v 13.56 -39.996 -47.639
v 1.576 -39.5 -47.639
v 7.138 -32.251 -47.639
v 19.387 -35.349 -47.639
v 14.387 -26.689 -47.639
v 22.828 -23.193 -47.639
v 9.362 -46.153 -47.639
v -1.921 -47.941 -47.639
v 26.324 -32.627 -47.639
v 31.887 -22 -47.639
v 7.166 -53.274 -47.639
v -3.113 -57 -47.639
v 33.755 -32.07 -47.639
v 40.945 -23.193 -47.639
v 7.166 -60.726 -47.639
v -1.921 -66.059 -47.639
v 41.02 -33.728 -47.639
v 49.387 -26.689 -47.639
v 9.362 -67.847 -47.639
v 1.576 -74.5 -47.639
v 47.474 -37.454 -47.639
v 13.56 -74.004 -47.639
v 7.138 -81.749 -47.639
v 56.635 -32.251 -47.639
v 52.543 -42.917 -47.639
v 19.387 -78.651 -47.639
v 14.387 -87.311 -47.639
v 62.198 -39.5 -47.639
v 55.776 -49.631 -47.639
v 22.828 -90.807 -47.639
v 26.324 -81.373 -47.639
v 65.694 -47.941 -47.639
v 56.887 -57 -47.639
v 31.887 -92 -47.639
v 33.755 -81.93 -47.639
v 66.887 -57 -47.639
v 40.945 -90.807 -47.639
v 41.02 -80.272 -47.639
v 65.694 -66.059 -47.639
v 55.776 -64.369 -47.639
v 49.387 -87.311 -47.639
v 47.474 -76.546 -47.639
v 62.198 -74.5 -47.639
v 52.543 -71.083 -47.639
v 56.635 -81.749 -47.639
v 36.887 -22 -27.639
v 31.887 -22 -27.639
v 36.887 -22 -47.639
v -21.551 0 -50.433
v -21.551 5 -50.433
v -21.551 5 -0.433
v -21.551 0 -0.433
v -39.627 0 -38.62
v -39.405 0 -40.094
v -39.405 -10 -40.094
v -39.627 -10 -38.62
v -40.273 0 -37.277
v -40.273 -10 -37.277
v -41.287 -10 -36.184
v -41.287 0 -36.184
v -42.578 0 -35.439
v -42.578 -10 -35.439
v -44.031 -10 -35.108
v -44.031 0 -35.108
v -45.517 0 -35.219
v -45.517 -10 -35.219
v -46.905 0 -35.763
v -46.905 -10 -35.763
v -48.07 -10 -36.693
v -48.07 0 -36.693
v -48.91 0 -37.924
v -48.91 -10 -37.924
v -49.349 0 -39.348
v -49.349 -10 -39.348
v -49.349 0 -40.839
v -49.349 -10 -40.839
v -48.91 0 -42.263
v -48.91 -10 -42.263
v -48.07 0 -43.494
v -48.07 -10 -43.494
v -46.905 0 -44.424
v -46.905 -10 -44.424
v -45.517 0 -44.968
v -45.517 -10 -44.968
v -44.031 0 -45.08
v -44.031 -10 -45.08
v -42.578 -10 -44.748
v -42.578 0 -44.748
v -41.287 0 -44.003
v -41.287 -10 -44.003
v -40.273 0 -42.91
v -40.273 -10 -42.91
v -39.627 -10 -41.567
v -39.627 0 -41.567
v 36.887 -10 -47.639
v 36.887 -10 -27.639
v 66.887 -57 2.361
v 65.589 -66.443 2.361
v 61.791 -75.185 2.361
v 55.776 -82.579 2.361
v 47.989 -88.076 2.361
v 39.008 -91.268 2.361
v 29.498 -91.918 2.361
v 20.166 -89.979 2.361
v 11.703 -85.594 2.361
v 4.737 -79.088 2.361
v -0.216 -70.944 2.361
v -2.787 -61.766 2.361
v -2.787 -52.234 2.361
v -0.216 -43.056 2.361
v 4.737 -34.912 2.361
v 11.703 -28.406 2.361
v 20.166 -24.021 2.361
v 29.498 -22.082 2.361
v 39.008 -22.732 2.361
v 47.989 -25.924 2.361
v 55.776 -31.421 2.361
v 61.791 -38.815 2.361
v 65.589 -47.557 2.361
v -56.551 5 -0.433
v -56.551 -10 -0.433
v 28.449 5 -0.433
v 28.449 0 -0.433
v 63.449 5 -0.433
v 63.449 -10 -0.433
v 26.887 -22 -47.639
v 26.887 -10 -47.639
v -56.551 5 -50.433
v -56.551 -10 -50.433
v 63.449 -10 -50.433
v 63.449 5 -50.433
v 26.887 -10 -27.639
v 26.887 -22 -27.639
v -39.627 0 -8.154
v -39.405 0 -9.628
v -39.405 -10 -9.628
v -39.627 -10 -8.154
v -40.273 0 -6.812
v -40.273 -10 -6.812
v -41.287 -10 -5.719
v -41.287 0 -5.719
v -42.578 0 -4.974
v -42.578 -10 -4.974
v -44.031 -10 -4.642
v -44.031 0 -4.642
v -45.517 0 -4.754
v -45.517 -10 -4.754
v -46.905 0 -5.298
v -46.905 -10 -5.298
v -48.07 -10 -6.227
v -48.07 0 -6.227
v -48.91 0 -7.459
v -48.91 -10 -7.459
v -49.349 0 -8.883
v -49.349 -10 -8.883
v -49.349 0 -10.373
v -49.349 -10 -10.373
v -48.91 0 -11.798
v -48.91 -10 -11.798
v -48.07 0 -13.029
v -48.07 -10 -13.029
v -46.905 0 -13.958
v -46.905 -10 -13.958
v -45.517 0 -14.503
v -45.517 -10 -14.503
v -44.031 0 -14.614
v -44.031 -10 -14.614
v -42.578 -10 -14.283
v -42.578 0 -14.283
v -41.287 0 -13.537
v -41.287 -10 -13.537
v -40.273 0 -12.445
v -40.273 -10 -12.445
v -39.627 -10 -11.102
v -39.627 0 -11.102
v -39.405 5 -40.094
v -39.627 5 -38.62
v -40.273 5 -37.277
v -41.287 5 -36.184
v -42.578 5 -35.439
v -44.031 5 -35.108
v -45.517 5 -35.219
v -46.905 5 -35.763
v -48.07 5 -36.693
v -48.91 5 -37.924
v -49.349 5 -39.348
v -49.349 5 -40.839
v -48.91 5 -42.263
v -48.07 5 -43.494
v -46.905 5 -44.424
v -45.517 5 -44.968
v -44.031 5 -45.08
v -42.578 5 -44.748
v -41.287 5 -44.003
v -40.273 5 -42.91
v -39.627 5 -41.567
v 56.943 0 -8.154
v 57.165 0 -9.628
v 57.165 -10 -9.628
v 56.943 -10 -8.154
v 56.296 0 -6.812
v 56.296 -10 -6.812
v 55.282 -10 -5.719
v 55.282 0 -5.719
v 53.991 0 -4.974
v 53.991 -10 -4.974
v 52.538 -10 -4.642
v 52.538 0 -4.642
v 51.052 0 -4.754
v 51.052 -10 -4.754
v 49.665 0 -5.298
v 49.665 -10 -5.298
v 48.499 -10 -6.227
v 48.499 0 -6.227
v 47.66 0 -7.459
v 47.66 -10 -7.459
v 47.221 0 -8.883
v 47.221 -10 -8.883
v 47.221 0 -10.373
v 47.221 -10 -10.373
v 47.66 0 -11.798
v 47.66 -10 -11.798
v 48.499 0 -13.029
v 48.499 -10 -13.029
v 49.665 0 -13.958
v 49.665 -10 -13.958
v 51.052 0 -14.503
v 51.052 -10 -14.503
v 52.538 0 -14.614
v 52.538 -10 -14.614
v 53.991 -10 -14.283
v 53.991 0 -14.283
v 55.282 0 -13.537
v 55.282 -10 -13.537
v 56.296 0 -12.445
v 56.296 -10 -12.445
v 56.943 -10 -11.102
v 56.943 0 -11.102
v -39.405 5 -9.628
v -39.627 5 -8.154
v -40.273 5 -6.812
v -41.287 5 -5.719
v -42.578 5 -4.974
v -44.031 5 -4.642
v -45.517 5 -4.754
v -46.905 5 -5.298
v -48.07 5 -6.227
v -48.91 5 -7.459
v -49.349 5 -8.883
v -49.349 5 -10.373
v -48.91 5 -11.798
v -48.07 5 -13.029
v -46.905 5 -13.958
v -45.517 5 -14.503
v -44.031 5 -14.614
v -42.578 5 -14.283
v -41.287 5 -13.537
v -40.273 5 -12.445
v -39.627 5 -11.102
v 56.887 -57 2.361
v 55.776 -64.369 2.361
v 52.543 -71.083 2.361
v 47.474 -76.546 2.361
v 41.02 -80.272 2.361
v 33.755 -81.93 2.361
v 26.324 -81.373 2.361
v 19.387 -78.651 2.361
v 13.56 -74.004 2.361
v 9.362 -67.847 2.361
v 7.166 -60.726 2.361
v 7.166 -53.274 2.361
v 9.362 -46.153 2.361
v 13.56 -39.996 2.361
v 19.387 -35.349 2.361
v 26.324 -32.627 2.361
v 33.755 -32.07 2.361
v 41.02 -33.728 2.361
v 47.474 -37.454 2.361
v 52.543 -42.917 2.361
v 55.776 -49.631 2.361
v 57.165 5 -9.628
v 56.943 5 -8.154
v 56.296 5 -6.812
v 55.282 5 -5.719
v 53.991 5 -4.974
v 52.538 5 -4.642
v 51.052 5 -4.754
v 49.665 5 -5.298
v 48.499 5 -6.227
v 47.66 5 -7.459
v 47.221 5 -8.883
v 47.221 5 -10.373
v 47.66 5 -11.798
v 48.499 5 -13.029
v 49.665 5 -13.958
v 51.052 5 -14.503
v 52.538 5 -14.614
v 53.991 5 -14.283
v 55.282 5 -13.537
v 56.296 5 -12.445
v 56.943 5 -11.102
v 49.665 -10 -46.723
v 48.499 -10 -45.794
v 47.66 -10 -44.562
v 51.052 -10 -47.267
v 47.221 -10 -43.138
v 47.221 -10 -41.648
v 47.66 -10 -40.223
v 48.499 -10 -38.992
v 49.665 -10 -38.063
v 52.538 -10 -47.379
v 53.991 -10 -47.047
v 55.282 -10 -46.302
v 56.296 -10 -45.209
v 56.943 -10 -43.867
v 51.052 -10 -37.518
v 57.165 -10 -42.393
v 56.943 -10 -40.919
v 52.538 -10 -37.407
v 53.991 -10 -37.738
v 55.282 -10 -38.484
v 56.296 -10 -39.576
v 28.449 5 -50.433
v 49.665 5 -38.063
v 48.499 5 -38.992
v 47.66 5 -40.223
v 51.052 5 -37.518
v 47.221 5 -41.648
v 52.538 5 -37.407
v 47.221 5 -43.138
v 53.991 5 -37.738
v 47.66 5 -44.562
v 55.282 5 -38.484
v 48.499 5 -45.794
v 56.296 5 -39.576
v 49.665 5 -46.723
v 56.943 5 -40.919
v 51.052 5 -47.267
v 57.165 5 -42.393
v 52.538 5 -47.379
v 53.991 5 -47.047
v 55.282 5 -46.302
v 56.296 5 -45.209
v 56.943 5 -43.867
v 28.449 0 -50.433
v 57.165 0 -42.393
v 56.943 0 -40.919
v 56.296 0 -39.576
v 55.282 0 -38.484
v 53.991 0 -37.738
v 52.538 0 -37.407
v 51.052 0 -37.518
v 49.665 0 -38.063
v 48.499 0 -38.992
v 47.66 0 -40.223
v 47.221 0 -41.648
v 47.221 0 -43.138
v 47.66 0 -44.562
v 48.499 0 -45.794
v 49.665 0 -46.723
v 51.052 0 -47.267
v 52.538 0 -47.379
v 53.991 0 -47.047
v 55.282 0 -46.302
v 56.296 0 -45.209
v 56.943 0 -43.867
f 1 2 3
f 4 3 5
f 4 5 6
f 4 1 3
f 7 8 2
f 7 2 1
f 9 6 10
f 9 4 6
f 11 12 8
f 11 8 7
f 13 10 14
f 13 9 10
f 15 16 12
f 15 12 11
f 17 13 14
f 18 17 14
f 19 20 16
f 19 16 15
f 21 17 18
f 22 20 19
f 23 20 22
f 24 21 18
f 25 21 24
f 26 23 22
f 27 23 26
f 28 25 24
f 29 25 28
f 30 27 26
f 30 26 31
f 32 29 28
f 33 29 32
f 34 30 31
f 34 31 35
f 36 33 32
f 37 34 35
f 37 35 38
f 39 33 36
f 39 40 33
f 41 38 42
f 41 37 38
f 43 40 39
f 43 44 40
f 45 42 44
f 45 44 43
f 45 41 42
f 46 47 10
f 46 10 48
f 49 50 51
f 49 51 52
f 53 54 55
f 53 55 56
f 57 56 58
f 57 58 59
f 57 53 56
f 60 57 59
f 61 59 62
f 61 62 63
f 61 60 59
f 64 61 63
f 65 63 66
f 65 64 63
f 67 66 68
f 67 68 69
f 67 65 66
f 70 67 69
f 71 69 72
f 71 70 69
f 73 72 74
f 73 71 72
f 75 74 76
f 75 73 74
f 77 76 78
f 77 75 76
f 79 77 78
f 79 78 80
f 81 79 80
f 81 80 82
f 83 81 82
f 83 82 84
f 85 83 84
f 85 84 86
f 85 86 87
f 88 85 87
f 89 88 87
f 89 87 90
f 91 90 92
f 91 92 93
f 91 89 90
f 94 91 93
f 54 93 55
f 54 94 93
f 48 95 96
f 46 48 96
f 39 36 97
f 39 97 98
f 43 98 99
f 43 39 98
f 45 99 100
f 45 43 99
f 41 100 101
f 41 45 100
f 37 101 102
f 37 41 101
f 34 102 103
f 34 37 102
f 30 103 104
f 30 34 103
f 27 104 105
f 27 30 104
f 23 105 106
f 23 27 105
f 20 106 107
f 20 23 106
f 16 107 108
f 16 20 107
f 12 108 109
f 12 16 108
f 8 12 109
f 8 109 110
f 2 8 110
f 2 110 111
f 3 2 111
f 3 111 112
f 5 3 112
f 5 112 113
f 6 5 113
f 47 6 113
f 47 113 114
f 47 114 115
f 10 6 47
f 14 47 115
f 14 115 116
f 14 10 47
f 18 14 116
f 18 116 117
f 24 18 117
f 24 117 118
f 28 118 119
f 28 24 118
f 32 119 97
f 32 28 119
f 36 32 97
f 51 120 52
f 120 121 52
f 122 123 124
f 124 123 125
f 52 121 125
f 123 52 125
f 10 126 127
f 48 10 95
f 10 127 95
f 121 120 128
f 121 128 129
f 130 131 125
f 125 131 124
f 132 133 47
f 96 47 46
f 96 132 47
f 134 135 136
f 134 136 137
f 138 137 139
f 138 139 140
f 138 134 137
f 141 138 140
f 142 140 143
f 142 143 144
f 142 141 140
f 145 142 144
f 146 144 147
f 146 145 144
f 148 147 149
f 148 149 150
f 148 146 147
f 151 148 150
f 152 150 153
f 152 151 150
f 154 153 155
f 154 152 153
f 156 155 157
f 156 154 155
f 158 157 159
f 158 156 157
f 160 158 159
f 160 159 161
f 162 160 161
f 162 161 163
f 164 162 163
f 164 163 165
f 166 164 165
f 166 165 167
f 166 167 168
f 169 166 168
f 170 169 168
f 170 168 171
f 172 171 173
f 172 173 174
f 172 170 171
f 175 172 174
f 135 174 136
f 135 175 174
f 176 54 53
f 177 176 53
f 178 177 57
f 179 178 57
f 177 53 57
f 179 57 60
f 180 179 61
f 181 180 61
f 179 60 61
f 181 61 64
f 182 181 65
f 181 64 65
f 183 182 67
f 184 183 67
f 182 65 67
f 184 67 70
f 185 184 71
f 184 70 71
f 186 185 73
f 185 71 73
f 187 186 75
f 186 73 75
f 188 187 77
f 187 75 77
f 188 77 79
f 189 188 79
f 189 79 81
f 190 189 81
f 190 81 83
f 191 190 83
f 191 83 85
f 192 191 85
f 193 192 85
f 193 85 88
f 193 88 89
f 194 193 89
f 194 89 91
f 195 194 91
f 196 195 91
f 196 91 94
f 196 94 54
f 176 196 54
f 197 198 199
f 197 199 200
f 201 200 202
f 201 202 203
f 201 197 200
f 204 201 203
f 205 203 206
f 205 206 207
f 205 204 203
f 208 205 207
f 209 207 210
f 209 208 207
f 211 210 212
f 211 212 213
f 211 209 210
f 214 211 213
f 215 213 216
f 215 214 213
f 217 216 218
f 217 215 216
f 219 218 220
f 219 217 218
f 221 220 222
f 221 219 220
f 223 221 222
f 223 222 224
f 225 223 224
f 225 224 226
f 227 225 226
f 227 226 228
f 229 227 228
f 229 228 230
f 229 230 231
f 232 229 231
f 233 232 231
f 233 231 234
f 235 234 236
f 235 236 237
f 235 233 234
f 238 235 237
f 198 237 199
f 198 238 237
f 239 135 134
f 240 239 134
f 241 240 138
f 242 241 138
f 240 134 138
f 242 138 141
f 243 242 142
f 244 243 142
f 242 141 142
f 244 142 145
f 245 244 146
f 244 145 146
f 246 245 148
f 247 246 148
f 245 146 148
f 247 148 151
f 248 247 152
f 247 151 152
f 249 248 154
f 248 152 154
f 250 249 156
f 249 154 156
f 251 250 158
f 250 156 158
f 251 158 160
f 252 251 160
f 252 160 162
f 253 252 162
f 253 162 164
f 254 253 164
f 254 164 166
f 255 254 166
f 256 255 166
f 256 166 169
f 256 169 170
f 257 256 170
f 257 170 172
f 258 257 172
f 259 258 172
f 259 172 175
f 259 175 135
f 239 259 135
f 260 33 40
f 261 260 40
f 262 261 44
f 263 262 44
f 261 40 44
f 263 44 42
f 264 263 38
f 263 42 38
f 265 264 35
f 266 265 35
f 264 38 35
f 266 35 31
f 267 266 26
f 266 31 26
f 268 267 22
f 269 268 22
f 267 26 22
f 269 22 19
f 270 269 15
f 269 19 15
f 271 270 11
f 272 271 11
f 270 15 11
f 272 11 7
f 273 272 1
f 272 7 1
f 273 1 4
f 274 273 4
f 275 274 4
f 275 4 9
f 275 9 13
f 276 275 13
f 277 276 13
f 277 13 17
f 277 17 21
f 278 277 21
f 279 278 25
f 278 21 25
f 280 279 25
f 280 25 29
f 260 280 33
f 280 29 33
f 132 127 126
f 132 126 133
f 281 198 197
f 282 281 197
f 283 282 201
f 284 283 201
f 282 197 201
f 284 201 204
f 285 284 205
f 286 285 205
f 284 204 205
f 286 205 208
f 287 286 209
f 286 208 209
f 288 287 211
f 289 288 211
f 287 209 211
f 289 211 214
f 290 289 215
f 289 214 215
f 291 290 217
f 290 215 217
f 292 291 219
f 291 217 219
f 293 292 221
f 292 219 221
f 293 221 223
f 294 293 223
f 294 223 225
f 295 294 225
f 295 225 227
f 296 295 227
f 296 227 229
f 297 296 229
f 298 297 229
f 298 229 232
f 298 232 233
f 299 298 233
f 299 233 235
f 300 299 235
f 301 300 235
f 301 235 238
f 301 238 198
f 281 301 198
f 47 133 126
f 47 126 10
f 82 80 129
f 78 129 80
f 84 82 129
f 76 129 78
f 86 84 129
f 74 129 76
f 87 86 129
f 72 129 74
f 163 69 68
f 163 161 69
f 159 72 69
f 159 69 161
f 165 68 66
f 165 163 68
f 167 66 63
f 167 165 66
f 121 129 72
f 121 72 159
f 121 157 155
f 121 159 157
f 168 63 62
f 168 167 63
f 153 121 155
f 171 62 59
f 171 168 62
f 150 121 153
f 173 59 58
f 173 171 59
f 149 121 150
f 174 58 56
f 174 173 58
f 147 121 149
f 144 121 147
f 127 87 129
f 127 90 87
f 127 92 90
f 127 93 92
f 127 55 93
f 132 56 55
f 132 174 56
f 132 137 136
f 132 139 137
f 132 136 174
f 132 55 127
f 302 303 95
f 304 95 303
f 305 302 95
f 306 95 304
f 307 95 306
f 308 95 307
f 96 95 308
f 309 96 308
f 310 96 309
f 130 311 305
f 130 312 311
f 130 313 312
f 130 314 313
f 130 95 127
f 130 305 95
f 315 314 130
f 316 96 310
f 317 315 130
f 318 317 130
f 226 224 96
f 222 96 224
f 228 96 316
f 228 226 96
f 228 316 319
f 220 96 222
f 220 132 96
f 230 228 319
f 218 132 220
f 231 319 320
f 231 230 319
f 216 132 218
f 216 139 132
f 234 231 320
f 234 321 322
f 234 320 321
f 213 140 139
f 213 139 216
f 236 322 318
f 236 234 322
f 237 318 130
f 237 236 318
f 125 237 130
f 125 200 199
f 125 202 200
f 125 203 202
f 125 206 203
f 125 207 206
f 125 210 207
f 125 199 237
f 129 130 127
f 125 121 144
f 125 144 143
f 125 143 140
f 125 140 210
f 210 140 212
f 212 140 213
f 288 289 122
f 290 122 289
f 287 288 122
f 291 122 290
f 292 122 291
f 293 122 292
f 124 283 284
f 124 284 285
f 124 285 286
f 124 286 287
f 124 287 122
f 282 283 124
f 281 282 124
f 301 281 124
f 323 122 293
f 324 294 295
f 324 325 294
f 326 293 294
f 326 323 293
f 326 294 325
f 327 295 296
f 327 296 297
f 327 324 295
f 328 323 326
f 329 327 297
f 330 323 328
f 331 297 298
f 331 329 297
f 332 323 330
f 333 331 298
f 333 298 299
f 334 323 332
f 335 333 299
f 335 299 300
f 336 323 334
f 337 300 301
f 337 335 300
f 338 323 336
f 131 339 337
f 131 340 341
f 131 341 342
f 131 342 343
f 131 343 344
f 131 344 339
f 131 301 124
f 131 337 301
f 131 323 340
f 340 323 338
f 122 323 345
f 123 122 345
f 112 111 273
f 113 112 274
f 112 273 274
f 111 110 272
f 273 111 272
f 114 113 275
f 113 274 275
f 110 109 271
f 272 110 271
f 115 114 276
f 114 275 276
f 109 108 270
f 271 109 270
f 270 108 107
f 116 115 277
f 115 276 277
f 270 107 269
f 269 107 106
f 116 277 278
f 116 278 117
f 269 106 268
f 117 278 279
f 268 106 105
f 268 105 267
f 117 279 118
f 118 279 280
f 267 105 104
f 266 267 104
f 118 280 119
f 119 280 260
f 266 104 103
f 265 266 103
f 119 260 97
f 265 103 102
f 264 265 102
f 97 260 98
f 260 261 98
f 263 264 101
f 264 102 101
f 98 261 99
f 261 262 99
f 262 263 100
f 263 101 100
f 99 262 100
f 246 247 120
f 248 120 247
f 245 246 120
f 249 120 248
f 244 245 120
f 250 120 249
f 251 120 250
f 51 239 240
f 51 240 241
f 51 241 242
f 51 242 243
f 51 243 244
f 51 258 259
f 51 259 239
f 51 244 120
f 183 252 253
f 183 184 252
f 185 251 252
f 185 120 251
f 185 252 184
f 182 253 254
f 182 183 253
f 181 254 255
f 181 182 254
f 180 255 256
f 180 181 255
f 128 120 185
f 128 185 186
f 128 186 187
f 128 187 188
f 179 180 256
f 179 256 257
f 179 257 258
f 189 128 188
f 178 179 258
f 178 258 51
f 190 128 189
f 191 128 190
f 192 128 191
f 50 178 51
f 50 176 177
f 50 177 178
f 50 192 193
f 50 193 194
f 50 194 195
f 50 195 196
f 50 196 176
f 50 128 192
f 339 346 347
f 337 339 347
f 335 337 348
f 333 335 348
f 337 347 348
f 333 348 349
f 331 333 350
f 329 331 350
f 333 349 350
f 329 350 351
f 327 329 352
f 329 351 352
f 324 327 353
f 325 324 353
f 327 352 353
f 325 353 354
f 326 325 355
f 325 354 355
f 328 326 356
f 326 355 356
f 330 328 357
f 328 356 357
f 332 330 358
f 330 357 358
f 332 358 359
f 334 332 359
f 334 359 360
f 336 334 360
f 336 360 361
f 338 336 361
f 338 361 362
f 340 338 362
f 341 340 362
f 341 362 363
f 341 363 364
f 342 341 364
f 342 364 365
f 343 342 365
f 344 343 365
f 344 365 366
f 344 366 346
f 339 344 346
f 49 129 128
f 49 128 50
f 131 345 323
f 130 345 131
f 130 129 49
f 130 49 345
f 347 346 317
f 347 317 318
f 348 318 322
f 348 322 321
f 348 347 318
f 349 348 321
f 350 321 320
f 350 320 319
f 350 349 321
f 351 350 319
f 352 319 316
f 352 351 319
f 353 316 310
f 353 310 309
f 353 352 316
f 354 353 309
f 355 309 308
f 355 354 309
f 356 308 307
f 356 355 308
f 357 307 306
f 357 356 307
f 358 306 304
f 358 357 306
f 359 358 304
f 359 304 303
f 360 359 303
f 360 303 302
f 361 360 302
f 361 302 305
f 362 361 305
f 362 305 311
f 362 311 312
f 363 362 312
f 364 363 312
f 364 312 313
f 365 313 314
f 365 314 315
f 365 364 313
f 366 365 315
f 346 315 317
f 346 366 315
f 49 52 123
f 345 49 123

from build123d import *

# Parameters (mm, degrees)
F0_W     = 120
F0_H     = 50
F0_R     = 5
F1_DEPTH = 10
F2_W     = 35
F2_H     = 5
F3_DEPTH = 50
F4_DEPTH = 5.001
F5_W     = 10
F5_H     = 20
F6_DEPTH = 12
F7_R     = 35
F7_R_2   = 25
F8_DEPTH = 50


with BuildPart() as f1:
    # F0 (on Front) → F1 (new body)
    with BuildSketch(Plane.XZ):
        with Locations((3.4489054233, -25.4326851939)):
            Rectangle(F0_W, F0_H)
        with Locations((-44.404655695, -40.0935262442)):
            Circle(F0_R, mode=Mode.SUBTRACT)
        with Locations((52.1646887064, -42.3927977681)):
            Circle(F0_R, mode=Mode.SUBTRACT)
        with Locations((-44.404655695, -9.6281943843)):
            Circle(F0_R, mode=Mode.SUBTRACT)
        with Locations((52.1646887064, -9.6281943843)):
            Circle(F0_R, mode=Mode.SUBTRACT)
    extrude(amount=F1_DEPTH)

    # F2 (on face) → F3 (join)
    with BuildSketch(Plane(origin=(0, 0, -50.4326851939), x_dir=(1, 0, 0), z_dir=(0, 0, -1))):
        with Locations((-39.0510945767, -2.5)):
            Rectangle(F2_W, F2_H)
        with Locations((45.9489054233, -2.5)):
            Rectangle(F2_W, F2_H)
    extrude(amount=-F3_DEPTH)

    # F4 (cut, through all): faces of the model
    f4_faces = [f1.faces().sort_by_distance(p)[0] for p in [
        (-44.404655695, 0, -9.6281943843),
        (-44.404655695, 0, -40.0935262442),
        (52.1646887064, 0, -9.6281943843),
        (52.1646887064, 0, -42.3927977681),
    ]]
    extrude(f4_faces, amount=-F4_DEPTH, mode=Mode.SUBTRACT)

    # F5 (on face) → F6 (join)
    with BuildSketch(Plane.XZ.offset(10)):
        with Locations((31.8867192038, -37.6391001046)):
            Rectangle(F5_W, F5_H)
    extrude(amount=F6_DEPTH)

    # F7 (on face) → F8 (join)
    with BuildSketch(Plane(origin=(0, 0, -47.6391001046), x_dir=(1, 0, 0), z_dir=(0, 0, -1))):
        with Locations((31.8867192038, 57)):
            Circle(F7_R)
        with Locations((31.8867192038, 57)):
            Circle(F7_R_2, mode=Mode.SUBTRACT)
    extrude(amount=-F8_DEPTH)


solid = f1.part
